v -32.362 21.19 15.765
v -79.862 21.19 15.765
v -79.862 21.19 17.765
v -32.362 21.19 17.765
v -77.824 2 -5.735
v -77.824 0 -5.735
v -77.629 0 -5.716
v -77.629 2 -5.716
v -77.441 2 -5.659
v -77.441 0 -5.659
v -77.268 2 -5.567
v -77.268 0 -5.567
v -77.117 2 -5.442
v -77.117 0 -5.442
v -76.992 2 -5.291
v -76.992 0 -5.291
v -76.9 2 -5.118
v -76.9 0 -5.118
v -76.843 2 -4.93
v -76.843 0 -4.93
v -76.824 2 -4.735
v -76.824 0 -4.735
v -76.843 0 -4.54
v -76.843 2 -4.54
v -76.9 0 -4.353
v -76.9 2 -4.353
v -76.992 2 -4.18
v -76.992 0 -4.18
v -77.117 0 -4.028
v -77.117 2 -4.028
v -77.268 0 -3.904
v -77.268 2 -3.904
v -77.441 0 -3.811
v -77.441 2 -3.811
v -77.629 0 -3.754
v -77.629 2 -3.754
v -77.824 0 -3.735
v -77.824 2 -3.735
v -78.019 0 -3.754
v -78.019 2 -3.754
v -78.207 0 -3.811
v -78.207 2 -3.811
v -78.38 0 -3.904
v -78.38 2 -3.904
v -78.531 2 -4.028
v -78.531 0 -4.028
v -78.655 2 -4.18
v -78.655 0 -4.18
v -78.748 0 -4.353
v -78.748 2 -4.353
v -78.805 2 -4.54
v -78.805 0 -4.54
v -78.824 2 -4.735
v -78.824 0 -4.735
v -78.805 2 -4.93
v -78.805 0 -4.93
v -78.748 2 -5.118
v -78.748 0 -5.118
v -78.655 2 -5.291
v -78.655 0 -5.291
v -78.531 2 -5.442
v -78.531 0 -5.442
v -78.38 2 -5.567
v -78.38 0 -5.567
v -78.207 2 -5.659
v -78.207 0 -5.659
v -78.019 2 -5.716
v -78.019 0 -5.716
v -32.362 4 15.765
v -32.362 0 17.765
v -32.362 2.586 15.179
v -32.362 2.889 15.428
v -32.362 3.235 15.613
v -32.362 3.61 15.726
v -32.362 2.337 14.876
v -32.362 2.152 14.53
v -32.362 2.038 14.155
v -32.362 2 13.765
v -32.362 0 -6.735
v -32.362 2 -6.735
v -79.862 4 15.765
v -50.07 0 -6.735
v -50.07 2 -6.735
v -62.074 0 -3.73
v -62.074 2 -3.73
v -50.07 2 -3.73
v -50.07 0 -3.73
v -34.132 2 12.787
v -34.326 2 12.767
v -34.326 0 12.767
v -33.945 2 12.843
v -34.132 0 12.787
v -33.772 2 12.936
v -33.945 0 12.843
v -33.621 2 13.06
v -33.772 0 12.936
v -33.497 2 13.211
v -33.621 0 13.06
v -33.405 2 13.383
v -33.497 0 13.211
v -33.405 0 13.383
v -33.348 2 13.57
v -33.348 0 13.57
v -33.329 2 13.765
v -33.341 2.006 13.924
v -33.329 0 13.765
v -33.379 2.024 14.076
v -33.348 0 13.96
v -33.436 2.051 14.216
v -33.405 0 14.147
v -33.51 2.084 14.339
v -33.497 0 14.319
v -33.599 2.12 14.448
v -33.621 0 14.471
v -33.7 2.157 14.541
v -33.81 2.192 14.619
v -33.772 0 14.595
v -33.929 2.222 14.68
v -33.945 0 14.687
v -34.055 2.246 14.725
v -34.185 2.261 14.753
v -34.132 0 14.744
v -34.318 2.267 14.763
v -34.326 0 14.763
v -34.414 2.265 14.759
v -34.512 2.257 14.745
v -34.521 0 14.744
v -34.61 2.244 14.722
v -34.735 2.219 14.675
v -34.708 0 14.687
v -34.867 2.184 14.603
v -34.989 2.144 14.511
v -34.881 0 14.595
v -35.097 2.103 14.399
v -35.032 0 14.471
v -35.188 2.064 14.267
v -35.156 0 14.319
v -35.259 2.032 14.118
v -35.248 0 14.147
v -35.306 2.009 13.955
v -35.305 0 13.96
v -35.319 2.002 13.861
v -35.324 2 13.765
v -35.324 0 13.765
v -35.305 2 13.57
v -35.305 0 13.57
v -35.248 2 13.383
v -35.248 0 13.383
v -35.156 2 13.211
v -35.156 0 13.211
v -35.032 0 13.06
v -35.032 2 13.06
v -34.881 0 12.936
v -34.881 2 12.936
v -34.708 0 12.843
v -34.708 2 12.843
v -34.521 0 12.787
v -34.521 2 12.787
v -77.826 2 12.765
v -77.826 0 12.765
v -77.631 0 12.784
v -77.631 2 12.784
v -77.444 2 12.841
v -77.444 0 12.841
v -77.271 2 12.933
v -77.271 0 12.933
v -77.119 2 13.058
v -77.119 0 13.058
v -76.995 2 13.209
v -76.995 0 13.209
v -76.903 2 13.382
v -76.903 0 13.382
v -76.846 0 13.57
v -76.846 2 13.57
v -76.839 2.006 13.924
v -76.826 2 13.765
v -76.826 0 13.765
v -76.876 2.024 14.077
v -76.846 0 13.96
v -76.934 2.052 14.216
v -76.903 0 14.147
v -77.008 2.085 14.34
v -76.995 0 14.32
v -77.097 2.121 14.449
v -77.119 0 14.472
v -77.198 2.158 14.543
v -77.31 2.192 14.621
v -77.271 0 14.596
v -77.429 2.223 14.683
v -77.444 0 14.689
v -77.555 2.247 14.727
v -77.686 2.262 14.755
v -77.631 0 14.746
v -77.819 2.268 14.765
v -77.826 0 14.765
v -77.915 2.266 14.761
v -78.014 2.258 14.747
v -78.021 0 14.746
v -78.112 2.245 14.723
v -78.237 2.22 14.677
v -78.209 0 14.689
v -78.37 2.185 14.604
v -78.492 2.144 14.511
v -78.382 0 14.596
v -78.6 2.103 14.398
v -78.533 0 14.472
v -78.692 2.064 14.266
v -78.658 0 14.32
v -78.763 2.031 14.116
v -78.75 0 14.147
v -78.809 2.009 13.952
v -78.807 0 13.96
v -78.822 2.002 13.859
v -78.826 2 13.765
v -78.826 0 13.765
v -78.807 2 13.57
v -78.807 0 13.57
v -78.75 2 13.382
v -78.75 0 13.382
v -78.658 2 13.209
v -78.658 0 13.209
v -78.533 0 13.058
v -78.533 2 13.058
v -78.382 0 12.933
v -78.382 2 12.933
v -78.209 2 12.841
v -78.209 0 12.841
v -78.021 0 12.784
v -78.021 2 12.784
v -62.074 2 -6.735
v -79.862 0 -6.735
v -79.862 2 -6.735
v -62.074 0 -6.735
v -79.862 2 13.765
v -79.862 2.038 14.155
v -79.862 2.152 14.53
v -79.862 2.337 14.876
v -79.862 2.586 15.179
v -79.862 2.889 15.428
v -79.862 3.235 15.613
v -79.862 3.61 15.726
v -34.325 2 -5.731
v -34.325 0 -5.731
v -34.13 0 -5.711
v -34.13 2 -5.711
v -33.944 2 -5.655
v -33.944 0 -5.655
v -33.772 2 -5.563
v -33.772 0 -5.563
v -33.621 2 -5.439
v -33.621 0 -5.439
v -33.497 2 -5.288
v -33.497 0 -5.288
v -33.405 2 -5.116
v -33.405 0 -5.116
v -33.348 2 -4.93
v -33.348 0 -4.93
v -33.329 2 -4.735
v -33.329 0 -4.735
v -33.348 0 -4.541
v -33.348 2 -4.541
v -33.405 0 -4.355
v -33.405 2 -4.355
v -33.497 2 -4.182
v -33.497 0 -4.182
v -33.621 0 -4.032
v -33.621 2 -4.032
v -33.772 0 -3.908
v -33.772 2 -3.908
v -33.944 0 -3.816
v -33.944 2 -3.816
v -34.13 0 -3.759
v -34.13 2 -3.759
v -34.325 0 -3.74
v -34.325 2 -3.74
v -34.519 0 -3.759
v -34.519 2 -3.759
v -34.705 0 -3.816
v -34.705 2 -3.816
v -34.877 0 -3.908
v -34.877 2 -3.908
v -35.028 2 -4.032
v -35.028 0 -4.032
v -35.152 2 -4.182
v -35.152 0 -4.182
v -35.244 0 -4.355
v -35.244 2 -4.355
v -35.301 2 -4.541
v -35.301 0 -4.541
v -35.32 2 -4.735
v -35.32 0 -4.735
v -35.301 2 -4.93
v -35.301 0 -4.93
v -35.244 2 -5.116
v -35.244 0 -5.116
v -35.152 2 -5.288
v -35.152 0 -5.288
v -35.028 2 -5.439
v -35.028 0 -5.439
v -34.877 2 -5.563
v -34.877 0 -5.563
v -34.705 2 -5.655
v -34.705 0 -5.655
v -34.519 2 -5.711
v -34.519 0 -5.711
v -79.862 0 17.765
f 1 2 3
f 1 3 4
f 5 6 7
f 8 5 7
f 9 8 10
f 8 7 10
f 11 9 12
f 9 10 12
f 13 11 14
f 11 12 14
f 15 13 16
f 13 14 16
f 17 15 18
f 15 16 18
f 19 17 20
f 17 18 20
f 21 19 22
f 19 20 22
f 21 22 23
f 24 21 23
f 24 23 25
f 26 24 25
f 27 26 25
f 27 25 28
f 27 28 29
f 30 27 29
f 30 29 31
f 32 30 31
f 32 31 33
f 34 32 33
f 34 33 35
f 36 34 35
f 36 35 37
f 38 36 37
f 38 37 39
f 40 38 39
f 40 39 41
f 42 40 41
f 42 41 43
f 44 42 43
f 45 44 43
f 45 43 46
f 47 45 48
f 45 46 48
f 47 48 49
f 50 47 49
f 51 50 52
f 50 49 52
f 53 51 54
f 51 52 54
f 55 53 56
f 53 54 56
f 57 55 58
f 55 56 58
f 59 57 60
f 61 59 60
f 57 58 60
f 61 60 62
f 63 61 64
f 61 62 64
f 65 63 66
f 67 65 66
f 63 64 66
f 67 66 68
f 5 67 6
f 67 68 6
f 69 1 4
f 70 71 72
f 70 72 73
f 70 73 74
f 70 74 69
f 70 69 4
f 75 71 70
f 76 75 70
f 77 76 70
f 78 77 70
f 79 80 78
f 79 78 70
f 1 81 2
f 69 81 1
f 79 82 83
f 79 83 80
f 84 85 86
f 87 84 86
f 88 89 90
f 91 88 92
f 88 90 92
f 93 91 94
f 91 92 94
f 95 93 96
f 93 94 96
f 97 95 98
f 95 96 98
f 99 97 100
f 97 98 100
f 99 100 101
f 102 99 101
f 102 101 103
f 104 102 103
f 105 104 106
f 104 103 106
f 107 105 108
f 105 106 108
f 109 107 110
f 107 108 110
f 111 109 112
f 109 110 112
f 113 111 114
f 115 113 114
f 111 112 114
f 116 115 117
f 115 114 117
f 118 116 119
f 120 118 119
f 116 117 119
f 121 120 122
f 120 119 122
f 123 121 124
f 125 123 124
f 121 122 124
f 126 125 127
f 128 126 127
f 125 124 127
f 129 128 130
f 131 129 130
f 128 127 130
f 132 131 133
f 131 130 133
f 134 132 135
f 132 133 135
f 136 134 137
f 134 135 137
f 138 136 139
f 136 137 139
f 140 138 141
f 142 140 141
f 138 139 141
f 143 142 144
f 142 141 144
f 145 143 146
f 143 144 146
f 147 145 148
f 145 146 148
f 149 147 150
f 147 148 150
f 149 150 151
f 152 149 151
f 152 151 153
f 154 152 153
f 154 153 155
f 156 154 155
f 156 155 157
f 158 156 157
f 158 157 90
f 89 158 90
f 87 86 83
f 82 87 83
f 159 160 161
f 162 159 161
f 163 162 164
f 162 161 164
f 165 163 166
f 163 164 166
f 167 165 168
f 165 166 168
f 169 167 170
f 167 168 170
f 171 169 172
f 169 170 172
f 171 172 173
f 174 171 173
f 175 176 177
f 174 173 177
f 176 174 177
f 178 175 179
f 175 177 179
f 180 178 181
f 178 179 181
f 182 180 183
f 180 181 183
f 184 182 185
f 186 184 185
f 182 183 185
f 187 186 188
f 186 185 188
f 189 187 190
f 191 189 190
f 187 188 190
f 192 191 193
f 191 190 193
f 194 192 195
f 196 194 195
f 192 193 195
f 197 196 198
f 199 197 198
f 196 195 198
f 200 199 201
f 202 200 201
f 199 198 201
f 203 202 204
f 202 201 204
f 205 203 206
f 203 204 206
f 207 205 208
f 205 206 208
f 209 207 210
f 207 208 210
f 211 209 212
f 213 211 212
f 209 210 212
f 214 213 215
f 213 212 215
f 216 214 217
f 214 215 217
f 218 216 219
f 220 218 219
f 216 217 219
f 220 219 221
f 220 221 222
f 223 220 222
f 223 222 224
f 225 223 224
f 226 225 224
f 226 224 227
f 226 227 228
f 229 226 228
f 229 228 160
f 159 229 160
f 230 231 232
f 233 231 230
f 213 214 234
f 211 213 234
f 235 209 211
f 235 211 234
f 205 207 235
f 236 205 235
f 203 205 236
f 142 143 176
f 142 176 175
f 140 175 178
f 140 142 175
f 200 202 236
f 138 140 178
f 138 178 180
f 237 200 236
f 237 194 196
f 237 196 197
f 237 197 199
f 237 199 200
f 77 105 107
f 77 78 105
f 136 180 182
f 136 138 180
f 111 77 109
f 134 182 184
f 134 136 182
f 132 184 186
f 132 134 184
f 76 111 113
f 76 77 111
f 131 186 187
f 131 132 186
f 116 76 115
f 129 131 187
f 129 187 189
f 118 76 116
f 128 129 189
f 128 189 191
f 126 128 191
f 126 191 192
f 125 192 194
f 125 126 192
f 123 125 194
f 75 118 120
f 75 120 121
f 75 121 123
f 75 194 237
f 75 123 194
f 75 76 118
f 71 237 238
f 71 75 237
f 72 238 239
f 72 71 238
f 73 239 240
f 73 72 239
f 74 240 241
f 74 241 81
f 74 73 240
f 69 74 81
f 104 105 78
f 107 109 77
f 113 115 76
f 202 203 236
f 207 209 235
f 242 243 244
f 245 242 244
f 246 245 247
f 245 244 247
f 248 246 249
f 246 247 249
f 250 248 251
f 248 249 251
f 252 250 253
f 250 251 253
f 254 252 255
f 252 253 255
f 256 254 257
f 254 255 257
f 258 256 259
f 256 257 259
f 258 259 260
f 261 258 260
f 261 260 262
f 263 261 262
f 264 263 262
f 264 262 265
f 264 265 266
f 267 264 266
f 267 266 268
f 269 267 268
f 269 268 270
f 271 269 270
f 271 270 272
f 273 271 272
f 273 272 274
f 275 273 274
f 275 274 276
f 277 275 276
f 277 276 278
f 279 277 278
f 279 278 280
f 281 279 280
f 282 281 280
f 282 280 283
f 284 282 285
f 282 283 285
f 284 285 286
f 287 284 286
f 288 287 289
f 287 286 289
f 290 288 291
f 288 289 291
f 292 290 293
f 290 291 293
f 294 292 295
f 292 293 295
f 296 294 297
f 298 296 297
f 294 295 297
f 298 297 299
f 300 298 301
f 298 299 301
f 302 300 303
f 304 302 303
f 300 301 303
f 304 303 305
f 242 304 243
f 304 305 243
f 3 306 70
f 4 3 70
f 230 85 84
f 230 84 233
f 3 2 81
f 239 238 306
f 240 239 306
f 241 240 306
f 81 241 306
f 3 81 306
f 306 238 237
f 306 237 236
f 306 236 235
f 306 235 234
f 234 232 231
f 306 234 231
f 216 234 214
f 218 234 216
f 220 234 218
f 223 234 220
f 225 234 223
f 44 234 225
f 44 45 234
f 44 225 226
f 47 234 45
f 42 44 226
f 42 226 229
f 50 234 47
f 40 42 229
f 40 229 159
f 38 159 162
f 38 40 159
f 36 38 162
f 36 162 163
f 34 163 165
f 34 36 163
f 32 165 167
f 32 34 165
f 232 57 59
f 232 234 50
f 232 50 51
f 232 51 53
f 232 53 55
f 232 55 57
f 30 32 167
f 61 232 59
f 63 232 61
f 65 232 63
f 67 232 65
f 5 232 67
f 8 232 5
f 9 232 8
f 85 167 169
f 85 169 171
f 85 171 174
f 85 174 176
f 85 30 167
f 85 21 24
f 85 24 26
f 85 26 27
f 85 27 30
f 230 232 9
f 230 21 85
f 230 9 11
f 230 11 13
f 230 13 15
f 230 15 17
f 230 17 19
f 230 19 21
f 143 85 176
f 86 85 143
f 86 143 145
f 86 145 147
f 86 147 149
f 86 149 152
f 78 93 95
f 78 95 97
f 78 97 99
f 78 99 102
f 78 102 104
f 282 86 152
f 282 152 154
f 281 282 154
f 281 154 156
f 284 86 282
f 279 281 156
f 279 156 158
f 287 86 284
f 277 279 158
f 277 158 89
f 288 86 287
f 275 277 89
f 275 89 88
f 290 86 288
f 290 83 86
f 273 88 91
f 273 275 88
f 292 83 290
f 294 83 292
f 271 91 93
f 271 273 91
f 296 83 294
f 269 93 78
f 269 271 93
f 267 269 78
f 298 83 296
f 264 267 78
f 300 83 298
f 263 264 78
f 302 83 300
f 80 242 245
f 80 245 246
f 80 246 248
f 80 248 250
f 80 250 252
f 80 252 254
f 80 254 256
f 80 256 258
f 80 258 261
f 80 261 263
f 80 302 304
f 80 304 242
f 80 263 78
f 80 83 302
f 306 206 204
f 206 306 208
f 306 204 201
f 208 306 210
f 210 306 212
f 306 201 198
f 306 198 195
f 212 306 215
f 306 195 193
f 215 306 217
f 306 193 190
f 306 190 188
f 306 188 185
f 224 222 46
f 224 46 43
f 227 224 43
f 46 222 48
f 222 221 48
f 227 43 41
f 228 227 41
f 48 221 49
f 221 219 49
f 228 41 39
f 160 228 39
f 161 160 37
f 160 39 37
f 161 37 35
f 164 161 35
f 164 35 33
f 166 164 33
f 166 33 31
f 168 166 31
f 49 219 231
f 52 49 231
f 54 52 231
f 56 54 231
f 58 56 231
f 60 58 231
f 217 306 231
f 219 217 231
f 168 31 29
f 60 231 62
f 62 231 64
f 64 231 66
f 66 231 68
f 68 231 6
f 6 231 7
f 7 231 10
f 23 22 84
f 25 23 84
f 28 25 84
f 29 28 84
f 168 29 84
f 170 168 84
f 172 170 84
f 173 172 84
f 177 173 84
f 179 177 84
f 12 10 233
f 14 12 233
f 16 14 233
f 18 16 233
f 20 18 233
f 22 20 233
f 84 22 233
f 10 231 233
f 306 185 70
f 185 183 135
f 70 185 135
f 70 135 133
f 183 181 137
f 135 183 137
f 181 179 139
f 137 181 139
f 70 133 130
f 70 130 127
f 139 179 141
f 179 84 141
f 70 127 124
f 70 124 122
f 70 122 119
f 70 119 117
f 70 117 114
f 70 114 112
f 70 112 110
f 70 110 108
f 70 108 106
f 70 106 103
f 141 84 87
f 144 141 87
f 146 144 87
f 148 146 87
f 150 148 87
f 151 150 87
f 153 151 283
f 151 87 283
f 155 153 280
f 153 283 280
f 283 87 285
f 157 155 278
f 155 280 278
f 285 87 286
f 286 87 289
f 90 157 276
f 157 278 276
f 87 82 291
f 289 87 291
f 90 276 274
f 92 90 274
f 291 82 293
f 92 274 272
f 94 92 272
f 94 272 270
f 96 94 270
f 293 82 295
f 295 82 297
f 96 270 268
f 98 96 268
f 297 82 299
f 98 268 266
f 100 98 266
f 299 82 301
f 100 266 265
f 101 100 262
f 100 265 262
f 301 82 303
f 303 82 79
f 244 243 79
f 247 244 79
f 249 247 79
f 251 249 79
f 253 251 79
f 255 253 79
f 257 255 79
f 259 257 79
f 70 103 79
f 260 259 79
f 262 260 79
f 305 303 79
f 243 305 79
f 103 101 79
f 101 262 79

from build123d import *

# Parameters (mm, degrees)
SKETCH3_W           = 47.5
SKETCH3_H           = 22.5
BOSS_EXTRUDE1_DEPTH = 2
SKETCH56_R          = 0.99762119
CUT_EXTRUDE1_DEPTH  = 10
SKETCH53_R          = 0.995230863
CUT_EXTRUDE2_DEPTH  = 10
SKETCH52_R          = 1
CUT_EXTRUDE3_DEPTH  = 10
SKETCH57_R          = 1
CUT_EXTRUDE4_DEPTH  = 10
SKETCH74_W          = 12.004185621
SKETCH74_H          = 3.004883548
CUT_EXTRUDE6_DEPTH  = 10
SKETCH79_W          = 47.5
SKETCH79_H          = 2
BOSS_EXTRUDE2_DEPTH = 21.190075336
FILLET6_R           = 2


with BuildPart() as part:
    # Sketch3 → Boss-Extrude1 (new body)
    with BuildSketch(Plane(origin=(0, 0, 0), x_dir=(1, 0, 0), z_dir=(0, 1, 0))):
        with Locations((-56.111912524, -4.514800621)):
            Rectangle(SKETCH3_W, SKETCH3_H)
    extrude(amount=BOSS_EXTRUDE1_DEPTH)

    # Sketch56 → Cut-Extrude1 (cut)
    with BuildSketch(Plane(origin=(0, 0, 0), x_dir=(-1, 0, 0), z_dir=(0, -1, 0))):
        with Locations(Location((34.326389274, -13.765097561, 0), (0, 0, 90))):
            Circle(SKETCH56_R)
    extrude(amount=-CUT_EXTRUDE1_DEPTH, mode=Mode.SUBTRACT)

    # Sketch53 → Cut-Extrude2 (cut)
    with BuildSketch(Plane(origin=(0.004388193, 0, 0), x_dir=(-1, 0, 0), z_dir=(0, -1, 0))):
        with Locations(Location((34.328904029, 4.735389548, 0), (0, 0, 90))):
            Circle(SKETCH53_R)
    extrude(amount=-CUT_EXTRUDE2_DEPTH, mode=Mode.SUBTRACT)

    # Sketch52 → Cut-Extrude3 (cut)
    with BuildSketch(Plane(origin=(0, 0, -0.040736422), x_dir=(1, 0, 0), z_dir=(0, -1, 0))):
        with Locations(Location((-77.82393232, -4.694462956, 0), (0, 0, 270))):
            Circle(SKETCH52_R)
    extrude(amount=-CUT_EXTRUDE3_DEPTH, mode=Mode.SUBTRACT)

    # Sketch57 → Cut-Extrude4 (cut)
    with BuildSketch(Plane.XZ):
        with Locations(Location((-77.826389274, 13.764800621, 0), (0, 0, 270))):
            Circle(SKETCH57_R)
    extrude(amount=-CUT_EXTRUDE4_DEPTH, mode=Mode.SUBTRACT)

    # Sketch74 → Cut-Extrude6 (cut)
    with BuildSketch(Plane(origin=(0, 2, 0), x_dir=(1, 0, 0), z_dir=(0, 1, 0))):
        with Locations((-56.07183951, 5.232757605)):
            Rectangle(SKETCH74_W, SKETCH74_H)
    extrude(amount=-CUT_EXTRUDE6_DEPTH, mode=Mode.SUBTRACT)

    # Sketch79 → Boss-Extrude2 (add)
    with BuildSketch(Plane(origin=(0, 0, 0), x_dir=(1, 0, 0), z_dir=(0, 1, 0))):
        with Locations((-56.111912524, -16.764800621)):
            Rectangle(SKETCH79_W, SKETCH79_H)
    extrude(amount=BOSS_EXTRUDE2_DEPTH)

    # Fillet6
    # the kernel refuses this fillet: 2 mm, written as the material it adds along each edge
    with BuildSketch(Plane(origin=(-32.361912524, 2, 15.764800621), x_dir=(0, 1, 0), z_dir=(-1, 0, 0))) as fillet6_piece_1_section:
        with BuildLine():
            CenterArc((FILLET6_R, FILLET6_R), FILLET6_R, 180, 90)
            Line((0, FILLET6_R), (0, 0))
            Line((0, 0), (FILLET6_R, 0))
        make_face()
    fillet6_piece_1 = extrude(amount=47.5, mode=Mode.PRIVATE)
    fillet6_piece_1 = fillet6_piece_1 - Plane(origin=(-34.326389274, 2.455648449, 13.765097561), x_dir=(0, 0, -1), z_dir=(0, -1, 0)) * Cylinder(0.99762119, 103, mode=Mode.PRIVATE)
    fillet6_piece_1 = fillet6_piece_1 - Plane(origin=(-77.826389274, 2.455648449, 13.764800621), x_dir=(0, 0, -1), z_dir=(0, -1, 0)) * Cylinder(1, 103, mode=Mode.PRIVATE)
    add(fillet6_piece_1)


solid = part.part
